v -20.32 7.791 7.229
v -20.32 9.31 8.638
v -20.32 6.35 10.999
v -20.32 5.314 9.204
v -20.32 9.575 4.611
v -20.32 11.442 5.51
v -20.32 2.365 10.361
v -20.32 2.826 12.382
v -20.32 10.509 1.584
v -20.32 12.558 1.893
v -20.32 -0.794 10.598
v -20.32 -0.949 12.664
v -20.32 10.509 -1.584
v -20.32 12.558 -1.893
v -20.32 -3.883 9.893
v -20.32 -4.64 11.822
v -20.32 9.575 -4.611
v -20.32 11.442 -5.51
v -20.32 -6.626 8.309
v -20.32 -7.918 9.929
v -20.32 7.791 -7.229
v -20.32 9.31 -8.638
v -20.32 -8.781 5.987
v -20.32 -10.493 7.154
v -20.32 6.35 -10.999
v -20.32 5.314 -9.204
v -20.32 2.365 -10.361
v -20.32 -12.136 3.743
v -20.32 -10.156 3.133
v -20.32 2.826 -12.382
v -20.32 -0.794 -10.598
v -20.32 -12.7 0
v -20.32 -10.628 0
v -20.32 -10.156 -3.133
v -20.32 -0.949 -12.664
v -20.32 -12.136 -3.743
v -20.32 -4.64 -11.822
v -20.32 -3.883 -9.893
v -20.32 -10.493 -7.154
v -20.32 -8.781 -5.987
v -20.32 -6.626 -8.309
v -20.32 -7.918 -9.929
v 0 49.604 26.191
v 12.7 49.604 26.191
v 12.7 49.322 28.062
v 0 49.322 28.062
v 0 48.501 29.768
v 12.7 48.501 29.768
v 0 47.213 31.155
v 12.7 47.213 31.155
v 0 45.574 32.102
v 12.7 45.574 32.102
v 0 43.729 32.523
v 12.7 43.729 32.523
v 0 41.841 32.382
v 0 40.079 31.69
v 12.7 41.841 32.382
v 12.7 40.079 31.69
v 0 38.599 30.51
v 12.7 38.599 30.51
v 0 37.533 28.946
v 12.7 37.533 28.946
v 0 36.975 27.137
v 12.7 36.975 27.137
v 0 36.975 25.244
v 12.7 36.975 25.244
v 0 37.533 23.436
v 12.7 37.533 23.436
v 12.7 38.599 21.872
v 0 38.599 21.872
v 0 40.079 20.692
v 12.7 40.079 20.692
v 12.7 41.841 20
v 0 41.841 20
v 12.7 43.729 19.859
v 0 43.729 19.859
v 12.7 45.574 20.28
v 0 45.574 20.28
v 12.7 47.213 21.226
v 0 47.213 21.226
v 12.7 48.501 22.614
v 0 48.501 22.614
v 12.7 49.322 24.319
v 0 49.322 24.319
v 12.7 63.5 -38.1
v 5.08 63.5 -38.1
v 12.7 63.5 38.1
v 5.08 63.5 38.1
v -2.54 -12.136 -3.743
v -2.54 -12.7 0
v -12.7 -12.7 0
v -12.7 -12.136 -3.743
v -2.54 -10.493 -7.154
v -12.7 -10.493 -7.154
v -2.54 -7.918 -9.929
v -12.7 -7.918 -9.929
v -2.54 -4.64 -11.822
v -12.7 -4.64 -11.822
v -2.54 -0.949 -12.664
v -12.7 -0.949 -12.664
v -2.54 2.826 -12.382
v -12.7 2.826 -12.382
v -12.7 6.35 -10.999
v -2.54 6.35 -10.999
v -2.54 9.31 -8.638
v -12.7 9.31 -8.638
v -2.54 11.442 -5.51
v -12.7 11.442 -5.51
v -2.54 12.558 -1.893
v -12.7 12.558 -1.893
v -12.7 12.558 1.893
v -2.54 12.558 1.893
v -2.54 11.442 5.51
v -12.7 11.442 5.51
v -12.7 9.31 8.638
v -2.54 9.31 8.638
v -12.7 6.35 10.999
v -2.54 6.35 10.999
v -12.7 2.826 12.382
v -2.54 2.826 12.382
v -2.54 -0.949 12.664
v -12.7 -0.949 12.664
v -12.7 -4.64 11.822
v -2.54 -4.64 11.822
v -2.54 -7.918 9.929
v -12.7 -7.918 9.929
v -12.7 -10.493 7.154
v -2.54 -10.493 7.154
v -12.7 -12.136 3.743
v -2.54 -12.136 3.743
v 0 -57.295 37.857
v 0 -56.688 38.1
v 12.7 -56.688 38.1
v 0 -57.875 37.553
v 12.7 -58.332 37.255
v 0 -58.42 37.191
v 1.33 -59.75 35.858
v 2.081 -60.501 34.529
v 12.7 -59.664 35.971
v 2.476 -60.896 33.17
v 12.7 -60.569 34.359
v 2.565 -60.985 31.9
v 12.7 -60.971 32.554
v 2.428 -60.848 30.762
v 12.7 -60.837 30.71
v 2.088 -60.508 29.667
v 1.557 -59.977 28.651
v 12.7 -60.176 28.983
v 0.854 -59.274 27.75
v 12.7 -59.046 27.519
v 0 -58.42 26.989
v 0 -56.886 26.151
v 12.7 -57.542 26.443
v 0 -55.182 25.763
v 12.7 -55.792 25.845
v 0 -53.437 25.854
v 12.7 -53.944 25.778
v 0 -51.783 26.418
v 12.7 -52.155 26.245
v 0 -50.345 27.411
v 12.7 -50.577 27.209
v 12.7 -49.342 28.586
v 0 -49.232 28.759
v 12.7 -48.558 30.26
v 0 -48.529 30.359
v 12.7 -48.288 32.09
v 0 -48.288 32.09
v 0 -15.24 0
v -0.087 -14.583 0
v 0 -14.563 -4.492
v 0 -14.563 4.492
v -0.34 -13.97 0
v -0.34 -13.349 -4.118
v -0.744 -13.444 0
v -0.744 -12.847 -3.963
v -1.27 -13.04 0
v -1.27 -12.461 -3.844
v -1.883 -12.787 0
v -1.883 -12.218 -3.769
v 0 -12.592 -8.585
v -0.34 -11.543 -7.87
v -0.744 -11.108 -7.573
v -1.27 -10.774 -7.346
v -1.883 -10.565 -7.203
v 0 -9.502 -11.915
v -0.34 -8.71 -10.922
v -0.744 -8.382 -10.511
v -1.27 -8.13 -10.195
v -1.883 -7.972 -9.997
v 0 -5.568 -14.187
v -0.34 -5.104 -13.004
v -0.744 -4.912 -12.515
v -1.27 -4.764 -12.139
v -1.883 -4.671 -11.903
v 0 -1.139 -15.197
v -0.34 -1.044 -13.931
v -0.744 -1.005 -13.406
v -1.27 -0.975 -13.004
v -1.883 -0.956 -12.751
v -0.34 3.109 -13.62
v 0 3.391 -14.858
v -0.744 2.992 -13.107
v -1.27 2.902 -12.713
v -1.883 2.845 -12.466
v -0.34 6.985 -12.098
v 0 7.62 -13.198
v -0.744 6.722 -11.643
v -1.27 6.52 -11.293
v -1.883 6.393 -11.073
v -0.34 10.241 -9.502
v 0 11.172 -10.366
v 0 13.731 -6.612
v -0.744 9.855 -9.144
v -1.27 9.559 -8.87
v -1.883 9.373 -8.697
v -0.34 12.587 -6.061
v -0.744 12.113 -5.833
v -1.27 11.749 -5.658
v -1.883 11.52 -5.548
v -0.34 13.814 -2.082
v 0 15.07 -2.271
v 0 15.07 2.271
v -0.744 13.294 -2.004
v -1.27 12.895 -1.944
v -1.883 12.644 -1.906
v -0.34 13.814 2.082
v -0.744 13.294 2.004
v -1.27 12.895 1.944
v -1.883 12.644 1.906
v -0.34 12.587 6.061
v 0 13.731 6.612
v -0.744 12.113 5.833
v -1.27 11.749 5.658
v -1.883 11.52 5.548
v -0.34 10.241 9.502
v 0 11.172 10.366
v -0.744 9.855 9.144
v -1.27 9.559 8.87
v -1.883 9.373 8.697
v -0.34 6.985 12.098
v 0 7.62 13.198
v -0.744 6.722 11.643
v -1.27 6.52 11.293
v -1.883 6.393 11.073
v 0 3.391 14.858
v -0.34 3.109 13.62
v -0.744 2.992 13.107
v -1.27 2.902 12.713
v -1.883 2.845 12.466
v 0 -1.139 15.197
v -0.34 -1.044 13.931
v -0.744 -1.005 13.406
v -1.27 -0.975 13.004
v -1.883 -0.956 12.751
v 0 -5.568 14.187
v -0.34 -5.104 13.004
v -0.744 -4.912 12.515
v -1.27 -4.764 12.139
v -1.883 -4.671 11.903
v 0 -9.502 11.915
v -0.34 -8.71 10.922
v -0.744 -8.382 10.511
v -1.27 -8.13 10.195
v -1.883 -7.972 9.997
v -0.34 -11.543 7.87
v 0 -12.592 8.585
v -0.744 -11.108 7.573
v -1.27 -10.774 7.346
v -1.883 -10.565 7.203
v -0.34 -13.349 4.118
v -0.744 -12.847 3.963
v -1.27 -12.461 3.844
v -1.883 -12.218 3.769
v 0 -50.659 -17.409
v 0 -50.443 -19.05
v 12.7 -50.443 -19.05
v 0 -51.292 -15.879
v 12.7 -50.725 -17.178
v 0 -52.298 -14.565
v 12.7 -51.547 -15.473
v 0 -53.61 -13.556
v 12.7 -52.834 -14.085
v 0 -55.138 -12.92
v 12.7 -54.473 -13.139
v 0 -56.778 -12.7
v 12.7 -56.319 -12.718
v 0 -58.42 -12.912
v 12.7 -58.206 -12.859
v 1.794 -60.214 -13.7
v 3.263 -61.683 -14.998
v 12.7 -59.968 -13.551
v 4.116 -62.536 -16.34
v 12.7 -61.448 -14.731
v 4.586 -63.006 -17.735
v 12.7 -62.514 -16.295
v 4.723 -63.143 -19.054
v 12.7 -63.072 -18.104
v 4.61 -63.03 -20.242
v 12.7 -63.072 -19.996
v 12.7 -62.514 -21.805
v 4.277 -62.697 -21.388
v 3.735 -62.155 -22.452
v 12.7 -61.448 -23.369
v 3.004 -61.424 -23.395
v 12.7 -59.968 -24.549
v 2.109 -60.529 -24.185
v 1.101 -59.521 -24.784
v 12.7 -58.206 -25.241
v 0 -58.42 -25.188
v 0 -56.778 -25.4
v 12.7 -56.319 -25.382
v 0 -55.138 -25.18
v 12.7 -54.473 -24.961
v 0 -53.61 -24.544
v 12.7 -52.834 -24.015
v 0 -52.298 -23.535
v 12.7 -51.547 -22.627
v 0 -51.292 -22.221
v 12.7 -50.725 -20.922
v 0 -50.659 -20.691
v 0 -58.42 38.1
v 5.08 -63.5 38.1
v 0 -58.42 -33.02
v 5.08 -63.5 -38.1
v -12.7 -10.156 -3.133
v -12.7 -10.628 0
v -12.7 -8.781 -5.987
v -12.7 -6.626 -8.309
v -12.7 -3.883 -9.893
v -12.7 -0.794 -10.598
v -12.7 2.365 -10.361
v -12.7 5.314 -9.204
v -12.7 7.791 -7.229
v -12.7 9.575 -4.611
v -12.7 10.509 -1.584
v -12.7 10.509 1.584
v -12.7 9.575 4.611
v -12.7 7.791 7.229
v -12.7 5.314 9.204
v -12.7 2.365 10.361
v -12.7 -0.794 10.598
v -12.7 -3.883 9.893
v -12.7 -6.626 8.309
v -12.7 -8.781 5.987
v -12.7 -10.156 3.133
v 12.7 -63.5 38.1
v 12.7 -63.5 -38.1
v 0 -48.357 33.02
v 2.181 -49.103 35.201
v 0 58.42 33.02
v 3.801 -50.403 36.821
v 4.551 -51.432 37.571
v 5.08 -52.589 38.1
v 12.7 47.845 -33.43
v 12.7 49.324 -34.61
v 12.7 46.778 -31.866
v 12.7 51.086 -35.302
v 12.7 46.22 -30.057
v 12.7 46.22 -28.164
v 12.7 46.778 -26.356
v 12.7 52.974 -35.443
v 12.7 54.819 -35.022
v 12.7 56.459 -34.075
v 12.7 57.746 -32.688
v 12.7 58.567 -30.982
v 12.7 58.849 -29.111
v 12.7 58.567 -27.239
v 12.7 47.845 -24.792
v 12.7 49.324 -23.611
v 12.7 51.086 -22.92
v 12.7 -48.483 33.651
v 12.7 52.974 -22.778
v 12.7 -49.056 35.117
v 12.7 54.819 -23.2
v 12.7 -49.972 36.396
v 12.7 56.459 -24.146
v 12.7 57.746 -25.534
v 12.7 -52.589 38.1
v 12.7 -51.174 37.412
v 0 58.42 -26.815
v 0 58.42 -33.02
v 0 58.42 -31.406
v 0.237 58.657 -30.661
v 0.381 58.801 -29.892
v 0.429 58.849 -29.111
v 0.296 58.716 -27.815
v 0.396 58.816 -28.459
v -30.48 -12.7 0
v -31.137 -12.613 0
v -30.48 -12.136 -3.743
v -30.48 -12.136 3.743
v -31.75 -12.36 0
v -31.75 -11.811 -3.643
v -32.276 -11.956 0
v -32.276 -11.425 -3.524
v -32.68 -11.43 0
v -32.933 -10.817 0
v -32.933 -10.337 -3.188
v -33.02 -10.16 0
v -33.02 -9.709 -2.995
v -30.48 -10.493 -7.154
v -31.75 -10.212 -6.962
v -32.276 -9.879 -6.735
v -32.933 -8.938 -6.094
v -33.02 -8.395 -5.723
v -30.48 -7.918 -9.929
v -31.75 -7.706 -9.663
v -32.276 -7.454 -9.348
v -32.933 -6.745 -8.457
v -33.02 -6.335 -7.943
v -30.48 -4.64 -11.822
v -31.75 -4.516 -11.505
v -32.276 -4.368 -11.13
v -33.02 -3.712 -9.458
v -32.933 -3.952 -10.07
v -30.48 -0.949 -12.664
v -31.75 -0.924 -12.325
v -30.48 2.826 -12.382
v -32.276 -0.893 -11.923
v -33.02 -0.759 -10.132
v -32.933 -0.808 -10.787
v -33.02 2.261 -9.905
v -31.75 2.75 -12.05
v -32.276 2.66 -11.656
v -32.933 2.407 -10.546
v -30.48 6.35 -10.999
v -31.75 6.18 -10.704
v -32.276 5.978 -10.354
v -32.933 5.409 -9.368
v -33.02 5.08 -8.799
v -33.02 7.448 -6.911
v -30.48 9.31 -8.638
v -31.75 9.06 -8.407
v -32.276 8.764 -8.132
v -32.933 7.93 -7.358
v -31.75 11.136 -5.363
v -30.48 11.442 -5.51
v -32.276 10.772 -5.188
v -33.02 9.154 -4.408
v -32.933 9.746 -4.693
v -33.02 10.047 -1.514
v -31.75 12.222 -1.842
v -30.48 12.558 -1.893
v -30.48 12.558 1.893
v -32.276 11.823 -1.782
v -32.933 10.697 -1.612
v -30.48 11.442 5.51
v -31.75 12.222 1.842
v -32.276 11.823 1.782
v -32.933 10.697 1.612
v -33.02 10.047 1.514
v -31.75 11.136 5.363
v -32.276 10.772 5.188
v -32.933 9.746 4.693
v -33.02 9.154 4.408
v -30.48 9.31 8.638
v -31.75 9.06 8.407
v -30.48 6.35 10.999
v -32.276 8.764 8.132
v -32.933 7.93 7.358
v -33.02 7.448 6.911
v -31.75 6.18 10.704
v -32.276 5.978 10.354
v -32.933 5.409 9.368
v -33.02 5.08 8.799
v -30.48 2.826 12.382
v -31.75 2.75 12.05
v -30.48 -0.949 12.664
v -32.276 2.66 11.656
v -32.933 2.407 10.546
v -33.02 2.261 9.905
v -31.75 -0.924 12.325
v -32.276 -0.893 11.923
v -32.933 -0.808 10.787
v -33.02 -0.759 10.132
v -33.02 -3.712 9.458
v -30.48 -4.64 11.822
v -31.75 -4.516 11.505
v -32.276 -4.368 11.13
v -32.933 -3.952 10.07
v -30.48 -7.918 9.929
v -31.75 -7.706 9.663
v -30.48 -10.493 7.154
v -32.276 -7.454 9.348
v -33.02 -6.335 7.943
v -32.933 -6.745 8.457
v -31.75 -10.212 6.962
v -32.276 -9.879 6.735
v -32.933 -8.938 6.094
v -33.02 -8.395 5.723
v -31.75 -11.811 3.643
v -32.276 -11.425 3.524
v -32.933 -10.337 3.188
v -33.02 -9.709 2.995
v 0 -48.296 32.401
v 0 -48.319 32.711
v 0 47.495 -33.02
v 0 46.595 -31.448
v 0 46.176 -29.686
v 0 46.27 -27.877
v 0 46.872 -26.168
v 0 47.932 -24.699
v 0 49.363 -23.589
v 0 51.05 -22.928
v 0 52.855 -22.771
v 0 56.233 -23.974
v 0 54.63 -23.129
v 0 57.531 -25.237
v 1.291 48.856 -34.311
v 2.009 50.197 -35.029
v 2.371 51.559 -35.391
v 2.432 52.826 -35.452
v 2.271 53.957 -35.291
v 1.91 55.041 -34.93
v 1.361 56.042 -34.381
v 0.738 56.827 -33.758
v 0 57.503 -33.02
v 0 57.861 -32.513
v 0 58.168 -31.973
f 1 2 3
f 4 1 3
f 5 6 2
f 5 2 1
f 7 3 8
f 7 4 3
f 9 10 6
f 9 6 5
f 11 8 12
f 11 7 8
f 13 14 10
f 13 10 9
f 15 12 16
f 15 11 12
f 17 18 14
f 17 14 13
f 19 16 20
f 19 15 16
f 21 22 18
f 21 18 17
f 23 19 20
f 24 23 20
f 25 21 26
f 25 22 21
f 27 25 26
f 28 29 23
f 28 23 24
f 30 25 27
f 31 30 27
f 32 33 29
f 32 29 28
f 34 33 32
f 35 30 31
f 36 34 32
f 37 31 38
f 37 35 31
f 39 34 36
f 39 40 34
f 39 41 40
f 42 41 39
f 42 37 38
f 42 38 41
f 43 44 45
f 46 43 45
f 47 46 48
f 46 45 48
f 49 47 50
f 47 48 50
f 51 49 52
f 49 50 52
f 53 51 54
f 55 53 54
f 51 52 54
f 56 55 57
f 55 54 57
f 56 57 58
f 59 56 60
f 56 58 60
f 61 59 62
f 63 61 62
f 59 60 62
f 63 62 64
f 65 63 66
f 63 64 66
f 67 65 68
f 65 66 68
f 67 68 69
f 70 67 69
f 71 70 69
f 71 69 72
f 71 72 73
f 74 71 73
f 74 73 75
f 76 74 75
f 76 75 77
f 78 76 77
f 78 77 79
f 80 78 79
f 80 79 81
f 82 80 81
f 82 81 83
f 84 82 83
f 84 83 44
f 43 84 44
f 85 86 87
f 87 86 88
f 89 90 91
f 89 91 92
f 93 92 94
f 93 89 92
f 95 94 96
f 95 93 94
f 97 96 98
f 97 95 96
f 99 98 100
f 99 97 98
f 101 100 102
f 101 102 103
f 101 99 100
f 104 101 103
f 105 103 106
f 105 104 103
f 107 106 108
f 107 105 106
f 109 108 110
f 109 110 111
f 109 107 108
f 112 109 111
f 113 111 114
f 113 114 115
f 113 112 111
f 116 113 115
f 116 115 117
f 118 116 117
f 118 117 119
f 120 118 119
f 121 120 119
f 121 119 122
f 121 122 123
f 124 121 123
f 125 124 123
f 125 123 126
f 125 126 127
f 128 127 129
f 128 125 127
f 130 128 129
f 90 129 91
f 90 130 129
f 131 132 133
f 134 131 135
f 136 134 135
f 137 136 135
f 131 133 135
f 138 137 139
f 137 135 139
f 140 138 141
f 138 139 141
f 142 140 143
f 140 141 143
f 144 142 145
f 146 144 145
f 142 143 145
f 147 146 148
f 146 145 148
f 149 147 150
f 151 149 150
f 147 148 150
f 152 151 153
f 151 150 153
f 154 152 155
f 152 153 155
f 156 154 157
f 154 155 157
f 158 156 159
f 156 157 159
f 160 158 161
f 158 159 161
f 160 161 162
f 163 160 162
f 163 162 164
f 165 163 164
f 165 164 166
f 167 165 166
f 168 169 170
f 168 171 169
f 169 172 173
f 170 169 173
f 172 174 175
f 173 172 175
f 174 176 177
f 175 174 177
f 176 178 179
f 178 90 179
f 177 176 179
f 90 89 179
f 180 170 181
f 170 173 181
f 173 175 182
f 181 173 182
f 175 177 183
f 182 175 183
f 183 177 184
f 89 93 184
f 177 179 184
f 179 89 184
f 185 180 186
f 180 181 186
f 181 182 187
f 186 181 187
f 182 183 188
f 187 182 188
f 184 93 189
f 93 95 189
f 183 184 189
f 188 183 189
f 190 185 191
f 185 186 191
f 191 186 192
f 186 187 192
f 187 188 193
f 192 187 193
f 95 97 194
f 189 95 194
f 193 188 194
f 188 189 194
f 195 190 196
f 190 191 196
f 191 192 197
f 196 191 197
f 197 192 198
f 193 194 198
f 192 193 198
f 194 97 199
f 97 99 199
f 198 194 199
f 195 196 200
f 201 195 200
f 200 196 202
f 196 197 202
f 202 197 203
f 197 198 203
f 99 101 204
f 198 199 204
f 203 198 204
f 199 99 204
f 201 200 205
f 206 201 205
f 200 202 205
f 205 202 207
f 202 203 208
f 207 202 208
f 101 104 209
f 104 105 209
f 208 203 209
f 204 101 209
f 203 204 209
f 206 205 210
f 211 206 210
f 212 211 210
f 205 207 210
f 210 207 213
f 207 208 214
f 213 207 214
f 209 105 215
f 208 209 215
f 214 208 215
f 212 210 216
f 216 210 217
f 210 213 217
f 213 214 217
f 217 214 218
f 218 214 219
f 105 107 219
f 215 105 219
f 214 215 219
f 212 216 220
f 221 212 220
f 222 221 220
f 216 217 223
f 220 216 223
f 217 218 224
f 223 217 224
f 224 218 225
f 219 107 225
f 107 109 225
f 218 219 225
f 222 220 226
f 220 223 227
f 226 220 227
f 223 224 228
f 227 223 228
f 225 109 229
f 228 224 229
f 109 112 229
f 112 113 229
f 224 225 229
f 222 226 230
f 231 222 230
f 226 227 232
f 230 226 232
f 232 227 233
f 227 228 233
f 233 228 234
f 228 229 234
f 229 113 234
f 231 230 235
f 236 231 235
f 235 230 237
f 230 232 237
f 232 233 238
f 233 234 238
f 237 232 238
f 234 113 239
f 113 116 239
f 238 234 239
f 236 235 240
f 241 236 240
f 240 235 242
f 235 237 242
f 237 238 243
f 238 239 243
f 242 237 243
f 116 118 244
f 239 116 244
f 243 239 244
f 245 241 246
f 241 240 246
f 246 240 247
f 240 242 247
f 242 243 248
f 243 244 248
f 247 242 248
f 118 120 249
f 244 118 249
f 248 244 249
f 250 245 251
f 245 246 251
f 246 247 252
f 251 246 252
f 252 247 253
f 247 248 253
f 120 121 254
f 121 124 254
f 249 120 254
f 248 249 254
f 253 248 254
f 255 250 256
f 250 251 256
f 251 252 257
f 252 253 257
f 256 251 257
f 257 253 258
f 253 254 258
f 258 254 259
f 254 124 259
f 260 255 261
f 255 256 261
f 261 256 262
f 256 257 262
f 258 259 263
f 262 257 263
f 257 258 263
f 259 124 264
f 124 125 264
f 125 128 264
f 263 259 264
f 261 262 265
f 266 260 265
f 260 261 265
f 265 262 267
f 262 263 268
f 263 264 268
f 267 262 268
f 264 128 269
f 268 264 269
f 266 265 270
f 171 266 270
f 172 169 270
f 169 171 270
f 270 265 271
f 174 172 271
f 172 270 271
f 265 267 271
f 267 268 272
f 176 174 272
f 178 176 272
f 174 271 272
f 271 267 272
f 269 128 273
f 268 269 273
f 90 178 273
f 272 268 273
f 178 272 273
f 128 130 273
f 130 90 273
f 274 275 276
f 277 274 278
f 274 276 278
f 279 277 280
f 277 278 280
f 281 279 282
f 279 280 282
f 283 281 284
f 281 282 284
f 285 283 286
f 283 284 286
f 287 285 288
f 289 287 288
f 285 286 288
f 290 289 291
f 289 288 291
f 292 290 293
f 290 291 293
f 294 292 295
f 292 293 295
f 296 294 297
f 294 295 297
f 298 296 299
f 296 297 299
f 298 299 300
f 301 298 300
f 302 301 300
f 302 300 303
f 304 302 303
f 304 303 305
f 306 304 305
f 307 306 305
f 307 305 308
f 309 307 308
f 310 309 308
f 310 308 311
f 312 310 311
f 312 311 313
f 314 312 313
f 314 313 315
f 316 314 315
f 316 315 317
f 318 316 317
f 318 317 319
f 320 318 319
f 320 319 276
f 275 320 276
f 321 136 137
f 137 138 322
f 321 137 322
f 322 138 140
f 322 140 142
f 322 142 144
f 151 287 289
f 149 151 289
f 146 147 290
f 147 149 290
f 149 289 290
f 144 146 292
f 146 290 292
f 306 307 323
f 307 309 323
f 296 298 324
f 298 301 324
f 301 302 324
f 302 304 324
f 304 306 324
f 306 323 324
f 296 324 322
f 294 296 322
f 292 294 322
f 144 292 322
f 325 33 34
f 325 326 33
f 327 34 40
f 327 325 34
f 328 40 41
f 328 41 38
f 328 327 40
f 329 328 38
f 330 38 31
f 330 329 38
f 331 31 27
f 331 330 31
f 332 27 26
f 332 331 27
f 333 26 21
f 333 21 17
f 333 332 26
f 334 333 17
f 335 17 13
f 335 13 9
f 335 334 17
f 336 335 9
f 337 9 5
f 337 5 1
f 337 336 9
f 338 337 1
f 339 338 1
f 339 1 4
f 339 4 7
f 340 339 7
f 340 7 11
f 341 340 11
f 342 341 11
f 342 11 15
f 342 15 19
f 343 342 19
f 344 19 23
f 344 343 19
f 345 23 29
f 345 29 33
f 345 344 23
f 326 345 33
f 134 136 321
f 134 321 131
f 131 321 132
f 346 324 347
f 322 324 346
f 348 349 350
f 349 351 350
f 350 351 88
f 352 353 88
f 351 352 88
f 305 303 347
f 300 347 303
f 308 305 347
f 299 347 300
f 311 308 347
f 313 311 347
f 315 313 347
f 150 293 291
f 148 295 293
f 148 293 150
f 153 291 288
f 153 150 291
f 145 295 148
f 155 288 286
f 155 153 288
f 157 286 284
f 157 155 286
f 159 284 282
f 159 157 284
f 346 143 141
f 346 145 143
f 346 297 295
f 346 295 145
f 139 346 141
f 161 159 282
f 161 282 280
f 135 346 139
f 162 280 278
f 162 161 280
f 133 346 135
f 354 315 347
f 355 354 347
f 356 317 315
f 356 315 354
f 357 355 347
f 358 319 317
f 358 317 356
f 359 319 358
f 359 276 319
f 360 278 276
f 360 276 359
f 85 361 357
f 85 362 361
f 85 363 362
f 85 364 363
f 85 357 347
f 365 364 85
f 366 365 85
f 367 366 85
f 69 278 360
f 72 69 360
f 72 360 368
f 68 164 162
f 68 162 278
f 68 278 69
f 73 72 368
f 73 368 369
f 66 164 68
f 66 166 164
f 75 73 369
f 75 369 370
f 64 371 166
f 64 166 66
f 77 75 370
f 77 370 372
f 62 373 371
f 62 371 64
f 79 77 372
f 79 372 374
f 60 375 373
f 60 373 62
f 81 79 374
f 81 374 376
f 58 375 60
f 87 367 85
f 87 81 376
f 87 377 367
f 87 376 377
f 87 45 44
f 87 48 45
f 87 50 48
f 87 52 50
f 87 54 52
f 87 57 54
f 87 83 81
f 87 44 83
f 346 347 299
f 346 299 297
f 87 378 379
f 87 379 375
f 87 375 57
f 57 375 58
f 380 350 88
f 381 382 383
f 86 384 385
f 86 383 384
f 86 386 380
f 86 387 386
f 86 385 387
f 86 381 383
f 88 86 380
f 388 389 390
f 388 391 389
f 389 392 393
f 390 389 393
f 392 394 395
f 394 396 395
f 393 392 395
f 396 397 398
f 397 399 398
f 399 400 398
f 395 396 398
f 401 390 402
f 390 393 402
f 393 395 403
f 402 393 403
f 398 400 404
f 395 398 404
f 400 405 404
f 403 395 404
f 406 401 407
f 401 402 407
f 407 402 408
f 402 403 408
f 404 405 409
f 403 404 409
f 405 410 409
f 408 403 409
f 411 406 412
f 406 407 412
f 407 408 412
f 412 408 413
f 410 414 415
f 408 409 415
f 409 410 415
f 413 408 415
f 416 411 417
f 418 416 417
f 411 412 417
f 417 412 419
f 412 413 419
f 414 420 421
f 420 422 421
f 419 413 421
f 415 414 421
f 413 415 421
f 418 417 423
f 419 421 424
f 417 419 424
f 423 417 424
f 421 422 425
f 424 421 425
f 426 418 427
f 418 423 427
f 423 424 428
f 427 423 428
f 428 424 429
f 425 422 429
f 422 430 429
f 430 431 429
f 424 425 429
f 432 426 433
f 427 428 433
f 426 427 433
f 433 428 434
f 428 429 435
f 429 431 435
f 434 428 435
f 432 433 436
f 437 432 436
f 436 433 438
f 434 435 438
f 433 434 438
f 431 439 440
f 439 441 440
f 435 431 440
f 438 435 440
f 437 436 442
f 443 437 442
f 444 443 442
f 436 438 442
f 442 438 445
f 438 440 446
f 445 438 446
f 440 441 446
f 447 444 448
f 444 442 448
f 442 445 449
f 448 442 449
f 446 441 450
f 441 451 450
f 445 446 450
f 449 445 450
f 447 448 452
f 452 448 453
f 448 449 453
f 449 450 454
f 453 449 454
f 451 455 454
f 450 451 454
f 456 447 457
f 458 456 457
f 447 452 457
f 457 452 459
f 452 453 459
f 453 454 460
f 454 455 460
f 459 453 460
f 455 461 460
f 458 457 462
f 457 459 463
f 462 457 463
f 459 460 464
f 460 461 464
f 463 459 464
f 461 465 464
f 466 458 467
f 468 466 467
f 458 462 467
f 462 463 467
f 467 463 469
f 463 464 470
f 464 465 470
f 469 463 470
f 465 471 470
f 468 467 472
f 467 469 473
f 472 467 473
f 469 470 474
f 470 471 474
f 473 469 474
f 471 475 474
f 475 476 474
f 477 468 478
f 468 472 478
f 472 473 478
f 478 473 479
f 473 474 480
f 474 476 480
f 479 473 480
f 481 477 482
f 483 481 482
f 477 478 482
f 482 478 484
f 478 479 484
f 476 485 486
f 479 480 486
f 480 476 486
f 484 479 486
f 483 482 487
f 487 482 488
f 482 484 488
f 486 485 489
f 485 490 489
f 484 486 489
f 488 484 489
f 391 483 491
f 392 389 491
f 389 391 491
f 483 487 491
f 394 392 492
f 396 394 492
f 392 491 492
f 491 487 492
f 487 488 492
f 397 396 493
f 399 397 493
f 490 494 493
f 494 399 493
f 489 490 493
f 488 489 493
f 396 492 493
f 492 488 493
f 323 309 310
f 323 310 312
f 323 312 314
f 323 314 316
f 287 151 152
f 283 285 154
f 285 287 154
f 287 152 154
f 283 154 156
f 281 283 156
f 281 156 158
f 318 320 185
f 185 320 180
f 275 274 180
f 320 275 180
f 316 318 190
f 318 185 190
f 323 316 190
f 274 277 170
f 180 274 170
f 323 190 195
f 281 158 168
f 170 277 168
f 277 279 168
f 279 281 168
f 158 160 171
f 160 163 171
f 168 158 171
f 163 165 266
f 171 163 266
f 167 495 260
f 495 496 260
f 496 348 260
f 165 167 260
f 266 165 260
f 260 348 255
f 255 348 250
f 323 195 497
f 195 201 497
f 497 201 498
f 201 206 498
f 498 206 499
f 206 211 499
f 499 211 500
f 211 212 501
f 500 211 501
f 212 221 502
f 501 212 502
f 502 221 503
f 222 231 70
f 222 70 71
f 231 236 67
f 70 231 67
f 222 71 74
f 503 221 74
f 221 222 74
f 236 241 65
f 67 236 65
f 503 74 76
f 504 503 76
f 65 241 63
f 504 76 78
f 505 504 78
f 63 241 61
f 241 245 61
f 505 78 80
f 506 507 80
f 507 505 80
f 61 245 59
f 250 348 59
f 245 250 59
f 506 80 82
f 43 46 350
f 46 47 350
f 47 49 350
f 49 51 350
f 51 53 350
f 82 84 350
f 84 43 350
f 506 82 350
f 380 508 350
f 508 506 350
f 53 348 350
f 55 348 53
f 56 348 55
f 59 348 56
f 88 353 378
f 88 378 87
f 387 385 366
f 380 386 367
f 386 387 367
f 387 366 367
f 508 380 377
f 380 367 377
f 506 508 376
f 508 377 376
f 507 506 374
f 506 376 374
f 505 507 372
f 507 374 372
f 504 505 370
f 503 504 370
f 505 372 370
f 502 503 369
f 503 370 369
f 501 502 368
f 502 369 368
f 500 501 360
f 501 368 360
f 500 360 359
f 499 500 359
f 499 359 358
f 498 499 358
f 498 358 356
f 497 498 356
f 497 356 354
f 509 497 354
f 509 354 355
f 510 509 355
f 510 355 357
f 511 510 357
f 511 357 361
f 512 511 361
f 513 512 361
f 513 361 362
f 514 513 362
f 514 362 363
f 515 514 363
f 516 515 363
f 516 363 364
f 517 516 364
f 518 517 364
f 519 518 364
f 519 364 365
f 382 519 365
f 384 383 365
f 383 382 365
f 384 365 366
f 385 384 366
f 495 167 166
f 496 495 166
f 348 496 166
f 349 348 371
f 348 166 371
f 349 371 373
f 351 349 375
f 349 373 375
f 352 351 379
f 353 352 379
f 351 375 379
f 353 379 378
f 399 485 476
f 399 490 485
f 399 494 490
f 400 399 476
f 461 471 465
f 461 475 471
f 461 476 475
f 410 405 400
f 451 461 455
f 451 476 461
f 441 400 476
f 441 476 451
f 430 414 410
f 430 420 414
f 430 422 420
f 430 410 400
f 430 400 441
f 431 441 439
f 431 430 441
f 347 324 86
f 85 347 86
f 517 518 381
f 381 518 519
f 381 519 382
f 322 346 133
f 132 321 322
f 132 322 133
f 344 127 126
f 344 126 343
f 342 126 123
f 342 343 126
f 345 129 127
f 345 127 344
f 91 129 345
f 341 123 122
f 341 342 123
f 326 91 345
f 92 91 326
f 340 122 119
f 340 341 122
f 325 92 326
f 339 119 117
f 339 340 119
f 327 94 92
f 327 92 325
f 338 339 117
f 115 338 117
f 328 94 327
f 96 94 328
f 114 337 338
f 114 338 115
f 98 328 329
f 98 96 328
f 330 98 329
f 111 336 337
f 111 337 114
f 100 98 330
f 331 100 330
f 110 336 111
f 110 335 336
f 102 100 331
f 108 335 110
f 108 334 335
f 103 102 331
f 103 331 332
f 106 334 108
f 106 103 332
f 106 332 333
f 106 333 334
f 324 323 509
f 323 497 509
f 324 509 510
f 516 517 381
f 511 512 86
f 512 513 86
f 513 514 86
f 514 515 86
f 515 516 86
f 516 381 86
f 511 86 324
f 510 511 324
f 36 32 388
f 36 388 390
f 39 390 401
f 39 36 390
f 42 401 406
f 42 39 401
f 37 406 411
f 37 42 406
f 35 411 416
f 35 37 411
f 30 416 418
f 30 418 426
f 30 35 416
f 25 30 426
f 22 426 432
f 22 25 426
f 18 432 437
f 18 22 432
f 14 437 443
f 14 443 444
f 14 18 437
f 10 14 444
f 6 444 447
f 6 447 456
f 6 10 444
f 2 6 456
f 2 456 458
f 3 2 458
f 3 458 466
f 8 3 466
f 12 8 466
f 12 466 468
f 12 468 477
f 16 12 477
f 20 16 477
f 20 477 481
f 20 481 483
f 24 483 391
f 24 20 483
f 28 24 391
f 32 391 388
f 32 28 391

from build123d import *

# Parameters (mm, degrees)
F0_W        = 127
F0_H        = 76.2
F1_DEPTH    = 12.7
F2_R        = 6.35
F3_DEPTH    = 12.701
F4_W        = 7.6199990327
F4_H        = 10.6278949787
F6_R        = 2.54
F7_C1_SIZE  = 5.08
F7_T2_DEPTH = 153.1282991577
F7_T4_DEPTH = 97.2482991577
F7_T6_DEPTH = 92.1682991577


# Not quite as in the source:
# - a fillet or chamfer that OpenCascade refuses, or shapes differently, is made with other operations: its cross-section is extruded or revolved along the edge and cut away or added
# - a feature names something its author has since deleted; it is built from what else it names


with BuildPart() as f1:
    # F0 (on Right) → F1 (new body)
    with BuildSketch(Plane.YZ):
        Rectangle(F0_W, F0_H)
    extrude(amount=F1_DEPTH)

    # F2 (on face) → F3 (cut, through all)
    with BuildSketch(Plane.YZ.offset(12.7)):
        with BuildLine():
            ThreePointArc((-56.6875480297, 38.1), (-58.333550533, 26.9256825374), (-48.2882989585, 32.089752231))
            ThreePointArc((-48.2882989585, 32.089752231), (-49.4742292648, 35.7850038056), (-52.5890498873, 38.1))
            Line((-52.5890498873, 38.1), (-56.6875480297, 38.1))
        make_face()
        with Locations((-56.7933163234, -19.05)):
            Circle(F2_R)
        with Locations((52.4994003593, -29.1107435445)):
            Circle(F2_R)
        with Locations((43.2542454979, 26.190802066)):
            Circle(F2_R)
    extrude(amount=-F3_DEPTH, mode=Mode.SUBTRACT)

    # F4 (on Top) → F5 (revolve)
    with BuildSketch(Plane.XY):
        Polygon((-20.3199990327, -10.6278949787), (-20.3199990327, 0), (-33.0199990327, 0), (-33.0199990327, -12.7), (-20.3199990327, -12.7), align=None)
        with Locations((-16.5099995164, -5.3139474893)):
            Rectangle(F4_W, F4_H)
        Polygon((0, 0), (-12.7, 0), (-12.7, -10.6278949787), (-12.7, -12.7), (0, -12.7), align=None)
    revolve(axis=Axis((-26.6699990327, 0, 0), (1, 0, 0)))

    # F6
    f6_edges = [f1.edges().sort_by_distance(p)[0] for p in [
        (-33.019999, 12.7, 0),
        (0, 12.7, 0),
    ]]
    fillet(f6_edges, radius=F6_R)

    # F7: chamfer of 5.08 on 4 edges, made by hand

    # F7_c1
    f7_c1_edges = [f1.edges().sort_by_distance(p)[0] for p in [
        (0, 5.4554750563, 38.1),
    ]]
    chamfer(f7_c1_edges, length=F7_C1_SIZE)

    # F7_s3 → F7_t2 (cut)
    with BuildSketch(Plane.XZ.offset(-76.5641495789)):
        with BuildLine():
            Line((-0.1436840979, -32.8763159021), (5.2236840979, -38.2436840979))
            Line((5.2236840979, -38.2436840979), (5.2236840979, -38.3452840979))
            ThreePointArc((5.2236840979, -38.3452840979), (2.611842049, -38.2016), (0, -38.2016))
            Line((0, -38.2016), (-0.1016, -38.1))
            ThreePointArc((-0.1016, -38.1), (-0.1016, -35.488157951), (-0.2452840979, -32.8763159021))
            Line((-0.2452840979, -32.8763159021), (-0.1436840979, -32.8763159021))
        make_face()
    extrude(amount=F7_T2_DEPTH, mode=Mode.SUBTRACT)

    # F7_s5 → F7_t4 (cut)
    with BuildSketch(Plane.XY.offset(-46.0841495789)):
        with BuildLine():
            Line((-0.1436840979, -58.2763159021), (5.2236840979, -63.6436840979))
            Line((5.2236840979, -63.6436840979), (5.2236840979, -63.7452840979))
            ThreePointArc((5.2236840979, -63.7452840979), (2.611842049, -63.6016), (0, -63.6016))
            Line((0, -63.6016), (-0.1016, -63.5))
            ThreePointArc((-0.1016, -63.5), (-0.1016, -60.888157951), (-0.2452840979, -58.2763159021))
            Line((-0.2452840979, -58.2763159021), (-0.1436840979, -58.2763159021))
        make_face()
    extrude(amount=F7_T4_DEPTH, mode=Mode.SUBTRACT)

    # F7_s7 → F7_t6 (cut)
    with BuildSketch(Plane.XY.offset(-46.0841495789)):
        with BuildLine():
            Line((-0.1436840979, 58.2763159021), (5.2236840979, 63.6436840979))
            Line((5.2236840979, 63.6436840979), (5.2236840979, 63.7452840979))
            ThreePointArc((5.2236840979, 63.7452840979), (2.611842049, 63.6016), (0, 63.6016))
            Line((0, 63.6016), (-0.1016, 63.5))
            ThreePointArc((-0.1016, 63.5), (-0.1016, 60.888157951), (-0.2452840979, 58.2763159021))
            Line((-0.2452840979, 58.2763159021), (-0.1436840979, 58.2763159021))
        make_face()
    extrude(amount=F7_T6_DEPTH, mode=Mode.SUBTRACT)


solid = f1.part
